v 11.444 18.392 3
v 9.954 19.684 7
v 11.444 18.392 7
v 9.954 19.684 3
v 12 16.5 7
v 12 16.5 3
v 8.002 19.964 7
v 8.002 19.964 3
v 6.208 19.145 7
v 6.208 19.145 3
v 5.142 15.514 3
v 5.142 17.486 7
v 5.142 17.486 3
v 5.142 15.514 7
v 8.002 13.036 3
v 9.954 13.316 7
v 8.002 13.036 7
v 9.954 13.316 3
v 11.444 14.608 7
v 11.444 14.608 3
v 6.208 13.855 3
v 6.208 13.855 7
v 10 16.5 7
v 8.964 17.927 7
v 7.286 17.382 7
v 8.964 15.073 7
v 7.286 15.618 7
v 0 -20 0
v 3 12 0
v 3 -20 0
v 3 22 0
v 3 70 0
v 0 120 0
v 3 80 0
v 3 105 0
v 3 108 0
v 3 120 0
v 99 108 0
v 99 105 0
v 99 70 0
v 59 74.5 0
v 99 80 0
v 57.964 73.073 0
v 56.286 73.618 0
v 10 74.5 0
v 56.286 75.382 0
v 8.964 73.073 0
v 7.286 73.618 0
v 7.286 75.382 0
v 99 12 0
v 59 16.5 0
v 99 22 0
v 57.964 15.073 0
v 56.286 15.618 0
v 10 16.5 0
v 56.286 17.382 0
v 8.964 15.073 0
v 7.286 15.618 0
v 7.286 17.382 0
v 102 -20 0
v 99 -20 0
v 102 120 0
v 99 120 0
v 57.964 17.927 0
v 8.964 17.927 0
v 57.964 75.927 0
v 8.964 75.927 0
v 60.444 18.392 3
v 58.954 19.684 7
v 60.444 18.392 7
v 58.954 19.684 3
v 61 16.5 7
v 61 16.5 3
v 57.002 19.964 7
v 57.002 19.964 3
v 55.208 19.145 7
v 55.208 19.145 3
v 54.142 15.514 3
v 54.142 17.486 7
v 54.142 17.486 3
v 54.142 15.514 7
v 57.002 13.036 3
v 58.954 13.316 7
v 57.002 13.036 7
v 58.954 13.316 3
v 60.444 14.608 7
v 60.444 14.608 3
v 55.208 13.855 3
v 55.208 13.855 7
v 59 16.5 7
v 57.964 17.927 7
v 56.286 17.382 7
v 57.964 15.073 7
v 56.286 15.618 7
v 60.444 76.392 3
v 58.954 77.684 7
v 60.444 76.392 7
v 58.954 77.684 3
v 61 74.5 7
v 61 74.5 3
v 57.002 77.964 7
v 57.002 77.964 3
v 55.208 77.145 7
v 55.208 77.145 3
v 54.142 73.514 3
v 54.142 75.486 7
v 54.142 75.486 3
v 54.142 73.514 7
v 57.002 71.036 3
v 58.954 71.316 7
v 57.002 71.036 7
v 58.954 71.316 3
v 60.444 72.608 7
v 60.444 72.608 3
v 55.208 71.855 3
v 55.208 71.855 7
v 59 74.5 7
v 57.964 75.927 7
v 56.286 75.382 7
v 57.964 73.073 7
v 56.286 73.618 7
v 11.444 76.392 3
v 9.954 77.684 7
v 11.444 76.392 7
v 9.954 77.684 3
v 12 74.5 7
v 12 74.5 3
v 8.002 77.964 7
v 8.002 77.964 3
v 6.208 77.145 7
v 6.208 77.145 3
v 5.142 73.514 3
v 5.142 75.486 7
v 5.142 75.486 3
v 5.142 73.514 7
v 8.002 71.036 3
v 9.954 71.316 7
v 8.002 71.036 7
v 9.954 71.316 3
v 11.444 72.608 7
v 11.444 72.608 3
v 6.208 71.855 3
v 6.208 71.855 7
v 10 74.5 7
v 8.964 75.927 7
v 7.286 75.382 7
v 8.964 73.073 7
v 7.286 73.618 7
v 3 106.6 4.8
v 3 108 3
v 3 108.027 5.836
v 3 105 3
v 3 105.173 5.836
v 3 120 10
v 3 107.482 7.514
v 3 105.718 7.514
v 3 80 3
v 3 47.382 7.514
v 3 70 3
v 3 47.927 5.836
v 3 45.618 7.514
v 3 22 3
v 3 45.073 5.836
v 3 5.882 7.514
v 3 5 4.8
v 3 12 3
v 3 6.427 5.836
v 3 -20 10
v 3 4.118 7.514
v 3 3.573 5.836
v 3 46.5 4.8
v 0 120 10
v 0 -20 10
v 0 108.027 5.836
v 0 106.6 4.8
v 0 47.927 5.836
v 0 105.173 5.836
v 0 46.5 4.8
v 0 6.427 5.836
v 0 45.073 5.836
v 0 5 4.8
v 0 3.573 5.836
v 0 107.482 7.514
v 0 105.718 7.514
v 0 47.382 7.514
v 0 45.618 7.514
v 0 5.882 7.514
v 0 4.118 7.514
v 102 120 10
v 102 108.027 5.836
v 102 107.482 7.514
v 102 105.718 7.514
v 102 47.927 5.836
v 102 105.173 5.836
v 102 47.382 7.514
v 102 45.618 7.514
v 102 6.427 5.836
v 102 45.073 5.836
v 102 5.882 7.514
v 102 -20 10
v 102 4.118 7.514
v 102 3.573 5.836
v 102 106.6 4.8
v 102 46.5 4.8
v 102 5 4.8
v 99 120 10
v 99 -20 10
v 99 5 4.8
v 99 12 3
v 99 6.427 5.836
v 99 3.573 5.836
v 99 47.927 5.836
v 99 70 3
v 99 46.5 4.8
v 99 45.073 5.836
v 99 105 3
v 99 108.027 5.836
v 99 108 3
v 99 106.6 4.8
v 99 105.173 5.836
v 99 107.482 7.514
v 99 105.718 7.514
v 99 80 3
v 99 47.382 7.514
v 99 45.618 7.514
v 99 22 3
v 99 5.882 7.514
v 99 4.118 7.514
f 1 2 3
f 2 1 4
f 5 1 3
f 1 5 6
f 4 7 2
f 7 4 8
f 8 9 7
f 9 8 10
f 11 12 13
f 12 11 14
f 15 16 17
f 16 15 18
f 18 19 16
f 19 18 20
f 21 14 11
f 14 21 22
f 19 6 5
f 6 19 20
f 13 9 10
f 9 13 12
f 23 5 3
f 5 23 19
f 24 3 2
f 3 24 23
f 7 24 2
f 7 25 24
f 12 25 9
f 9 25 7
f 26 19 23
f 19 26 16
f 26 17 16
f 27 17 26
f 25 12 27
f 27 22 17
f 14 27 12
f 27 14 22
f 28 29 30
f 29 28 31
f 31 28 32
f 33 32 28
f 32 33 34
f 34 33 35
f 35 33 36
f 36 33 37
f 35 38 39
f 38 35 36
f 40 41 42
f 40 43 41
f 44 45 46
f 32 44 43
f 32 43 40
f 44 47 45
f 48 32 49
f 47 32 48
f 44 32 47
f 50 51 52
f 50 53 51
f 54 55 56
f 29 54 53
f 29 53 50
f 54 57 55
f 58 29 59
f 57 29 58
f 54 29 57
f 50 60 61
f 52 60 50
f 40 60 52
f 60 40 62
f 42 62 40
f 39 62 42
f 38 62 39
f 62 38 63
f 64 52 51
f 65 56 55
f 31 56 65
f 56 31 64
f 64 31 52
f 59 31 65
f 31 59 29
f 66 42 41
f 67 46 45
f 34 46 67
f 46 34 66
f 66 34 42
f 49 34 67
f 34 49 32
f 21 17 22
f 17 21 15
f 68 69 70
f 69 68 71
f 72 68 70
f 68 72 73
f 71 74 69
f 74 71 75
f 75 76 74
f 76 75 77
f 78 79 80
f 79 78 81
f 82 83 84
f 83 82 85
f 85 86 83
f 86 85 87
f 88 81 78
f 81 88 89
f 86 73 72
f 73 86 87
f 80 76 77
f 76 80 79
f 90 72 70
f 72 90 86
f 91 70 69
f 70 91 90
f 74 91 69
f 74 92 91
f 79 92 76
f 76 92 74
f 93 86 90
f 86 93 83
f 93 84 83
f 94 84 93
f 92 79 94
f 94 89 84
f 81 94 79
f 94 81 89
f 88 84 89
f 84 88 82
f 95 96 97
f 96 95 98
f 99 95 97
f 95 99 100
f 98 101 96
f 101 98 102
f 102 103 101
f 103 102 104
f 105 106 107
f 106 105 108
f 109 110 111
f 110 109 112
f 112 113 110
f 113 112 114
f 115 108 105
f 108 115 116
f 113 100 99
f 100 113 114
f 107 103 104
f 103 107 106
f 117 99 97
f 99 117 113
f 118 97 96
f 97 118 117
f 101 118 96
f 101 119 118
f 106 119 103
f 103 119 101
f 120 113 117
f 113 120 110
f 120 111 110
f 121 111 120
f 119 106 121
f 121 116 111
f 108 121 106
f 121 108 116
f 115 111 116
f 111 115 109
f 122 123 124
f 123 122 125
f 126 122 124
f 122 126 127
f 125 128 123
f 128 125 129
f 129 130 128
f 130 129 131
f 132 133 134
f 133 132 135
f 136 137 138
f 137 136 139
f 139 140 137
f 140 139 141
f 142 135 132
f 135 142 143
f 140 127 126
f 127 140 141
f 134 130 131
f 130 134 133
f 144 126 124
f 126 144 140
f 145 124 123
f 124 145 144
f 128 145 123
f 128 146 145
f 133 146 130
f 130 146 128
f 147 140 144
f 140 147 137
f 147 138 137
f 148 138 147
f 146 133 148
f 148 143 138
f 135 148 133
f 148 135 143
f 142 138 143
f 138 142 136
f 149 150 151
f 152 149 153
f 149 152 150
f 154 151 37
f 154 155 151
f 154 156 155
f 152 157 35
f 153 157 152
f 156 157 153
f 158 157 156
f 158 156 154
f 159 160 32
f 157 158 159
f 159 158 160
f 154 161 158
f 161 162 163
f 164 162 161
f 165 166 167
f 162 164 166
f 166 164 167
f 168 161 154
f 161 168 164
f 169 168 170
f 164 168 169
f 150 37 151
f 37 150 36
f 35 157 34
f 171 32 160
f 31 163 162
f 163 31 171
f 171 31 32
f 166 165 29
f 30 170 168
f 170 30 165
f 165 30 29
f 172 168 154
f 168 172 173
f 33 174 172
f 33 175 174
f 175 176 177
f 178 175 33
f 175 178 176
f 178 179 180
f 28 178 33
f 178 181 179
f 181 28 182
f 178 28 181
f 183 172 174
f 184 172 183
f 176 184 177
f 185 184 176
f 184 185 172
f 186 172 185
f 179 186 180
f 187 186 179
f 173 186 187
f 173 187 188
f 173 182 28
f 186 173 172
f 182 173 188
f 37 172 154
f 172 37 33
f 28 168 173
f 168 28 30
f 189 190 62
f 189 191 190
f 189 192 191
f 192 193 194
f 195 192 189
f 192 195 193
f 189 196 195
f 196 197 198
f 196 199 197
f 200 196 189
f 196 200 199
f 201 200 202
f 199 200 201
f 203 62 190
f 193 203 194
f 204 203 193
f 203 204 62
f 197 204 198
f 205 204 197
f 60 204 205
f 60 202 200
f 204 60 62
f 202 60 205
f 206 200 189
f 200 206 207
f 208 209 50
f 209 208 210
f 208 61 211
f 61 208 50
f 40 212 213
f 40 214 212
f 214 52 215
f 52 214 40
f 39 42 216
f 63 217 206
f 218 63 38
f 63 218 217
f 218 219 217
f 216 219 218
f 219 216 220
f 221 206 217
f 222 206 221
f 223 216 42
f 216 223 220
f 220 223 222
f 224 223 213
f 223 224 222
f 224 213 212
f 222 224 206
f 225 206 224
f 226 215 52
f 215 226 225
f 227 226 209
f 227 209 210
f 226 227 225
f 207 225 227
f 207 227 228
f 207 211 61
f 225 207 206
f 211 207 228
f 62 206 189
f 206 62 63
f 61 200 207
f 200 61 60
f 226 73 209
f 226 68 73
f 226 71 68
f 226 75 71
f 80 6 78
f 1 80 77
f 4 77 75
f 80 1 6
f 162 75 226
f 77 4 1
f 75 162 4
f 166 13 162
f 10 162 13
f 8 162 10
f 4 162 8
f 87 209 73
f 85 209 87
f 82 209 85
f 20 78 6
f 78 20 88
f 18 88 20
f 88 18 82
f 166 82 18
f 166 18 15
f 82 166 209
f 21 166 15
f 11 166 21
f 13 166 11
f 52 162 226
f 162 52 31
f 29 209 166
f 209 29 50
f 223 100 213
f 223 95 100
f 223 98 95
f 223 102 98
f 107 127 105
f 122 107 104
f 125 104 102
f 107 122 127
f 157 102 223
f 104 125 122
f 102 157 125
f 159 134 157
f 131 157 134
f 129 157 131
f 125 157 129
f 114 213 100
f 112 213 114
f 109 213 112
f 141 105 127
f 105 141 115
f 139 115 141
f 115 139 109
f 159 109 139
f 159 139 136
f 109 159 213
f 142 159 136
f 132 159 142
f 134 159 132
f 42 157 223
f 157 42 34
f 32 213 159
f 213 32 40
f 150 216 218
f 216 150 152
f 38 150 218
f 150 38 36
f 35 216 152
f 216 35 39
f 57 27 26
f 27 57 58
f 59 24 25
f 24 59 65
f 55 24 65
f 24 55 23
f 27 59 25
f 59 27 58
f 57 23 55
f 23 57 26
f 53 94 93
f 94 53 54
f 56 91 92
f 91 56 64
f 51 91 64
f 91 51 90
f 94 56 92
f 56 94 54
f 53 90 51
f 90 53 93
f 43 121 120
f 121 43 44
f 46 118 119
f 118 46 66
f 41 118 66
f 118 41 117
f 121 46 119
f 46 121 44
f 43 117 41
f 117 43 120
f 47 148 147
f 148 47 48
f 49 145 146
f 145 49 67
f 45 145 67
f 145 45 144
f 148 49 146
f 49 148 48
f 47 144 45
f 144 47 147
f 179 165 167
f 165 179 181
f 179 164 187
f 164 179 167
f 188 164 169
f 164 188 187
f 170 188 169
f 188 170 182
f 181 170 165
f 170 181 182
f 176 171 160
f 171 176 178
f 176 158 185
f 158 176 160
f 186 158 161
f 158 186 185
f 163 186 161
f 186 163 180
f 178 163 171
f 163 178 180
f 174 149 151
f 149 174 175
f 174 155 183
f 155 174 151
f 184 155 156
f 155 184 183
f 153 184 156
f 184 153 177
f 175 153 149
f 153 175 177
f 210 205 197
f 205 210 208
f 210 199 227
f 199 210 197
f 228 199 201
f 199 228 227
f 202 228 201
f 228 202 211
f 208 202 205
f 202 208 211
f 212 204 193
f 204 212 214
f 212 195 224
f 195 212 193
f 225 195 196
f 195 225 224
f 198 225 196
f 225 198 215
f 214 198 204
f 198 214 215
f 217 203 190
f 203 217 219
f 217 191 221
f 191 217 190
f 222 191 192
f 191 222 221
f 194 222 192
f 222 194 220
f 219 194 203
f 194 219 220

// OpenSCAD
th=3; // thickness
ra=4; // raiser
d1=0.01;d2=2*d1;

//translate([140,-40,0]) import("inc/Pi_Drive.stl");
translate([0,-20,0]) {
	difference() {
		union() {
			// side mount
			cube([th,140,10]);
			translate([102-3,0,0]) cube([th,140,10]);
			//
			//cube([th+5,140,th]);
			//
			//#translate([th+3.5+49,22,0]) cube([th,100,3]);
			// 1st
			translate([0,32,0]) cube([101,10,th]);
			// 2nd
			translate([0,100-10,0]) cube([101,10,th]);
			// 3rd
			translate([0,135-10,0]) cube([101,3,th]);
			// https://www.raspberrypi.org/blog/introducing-raspberry-pi-model-b-plus/
			for (y=[33:100:100]) {
				translate([th+3.5+2,3.5+y,0]) {
					translate([ 0, 0,0]) cylinder(d=7,h=th+ra);
					translate([49, 0,0]) cylinder(d=7,h=th+ra);		
					translate([49,58,0]) cylinder(d=7,h=th+ra);
					translate([ 0,58,0]) cylinder(d=7,h=th+ra);		
				}
			}
		}
		//		
		for (y=[33:100:100]) {
			translate([th+3.5+2,3.5+y,0]) {
				translate([ 0, 0,0]) cylinder(d=3,h=th+ra,$fn=5);
				translate([49, 0,0]) cylinder(d=3,h=th+ra,$fn=5);		
				translate([49,58,0]) cylinder(d=3,h=th+ra,$fn=5);
				translate([ 0,58,0]) cylinder(d=3,h=th+ra,$fn=5);		
			}
		}
		//
		translate([-d1,25,6.3]) rotate([0,90,0]) cylinder(d=3,h=th+d2,$fn=5);
		translate([-d1,66.5,6.3]) rotate([0,90,0]) cylinder(d=3,h=th+d2,$fn=5);
		translate([-d1,126.6,6.3]) rotate([0,90,0]) cylinder(d=3,h=th+d2,$fn=5);
		//
		translate([102-3-d1,25,6.3]) rotate([0,90,0]) cylinder(d=3,h=th+d2,$fn=5);
		translate([102-3-d1,66.5,6.3]) rotate([0,90,0]) cylinder(d=3,h=th+d2,$fn=5);
		translate([102-3-d1,126.6,6.3]) rotate([0,90,0]) cylinder(d=3,h=th+d2,$fn=5);
	}
}
